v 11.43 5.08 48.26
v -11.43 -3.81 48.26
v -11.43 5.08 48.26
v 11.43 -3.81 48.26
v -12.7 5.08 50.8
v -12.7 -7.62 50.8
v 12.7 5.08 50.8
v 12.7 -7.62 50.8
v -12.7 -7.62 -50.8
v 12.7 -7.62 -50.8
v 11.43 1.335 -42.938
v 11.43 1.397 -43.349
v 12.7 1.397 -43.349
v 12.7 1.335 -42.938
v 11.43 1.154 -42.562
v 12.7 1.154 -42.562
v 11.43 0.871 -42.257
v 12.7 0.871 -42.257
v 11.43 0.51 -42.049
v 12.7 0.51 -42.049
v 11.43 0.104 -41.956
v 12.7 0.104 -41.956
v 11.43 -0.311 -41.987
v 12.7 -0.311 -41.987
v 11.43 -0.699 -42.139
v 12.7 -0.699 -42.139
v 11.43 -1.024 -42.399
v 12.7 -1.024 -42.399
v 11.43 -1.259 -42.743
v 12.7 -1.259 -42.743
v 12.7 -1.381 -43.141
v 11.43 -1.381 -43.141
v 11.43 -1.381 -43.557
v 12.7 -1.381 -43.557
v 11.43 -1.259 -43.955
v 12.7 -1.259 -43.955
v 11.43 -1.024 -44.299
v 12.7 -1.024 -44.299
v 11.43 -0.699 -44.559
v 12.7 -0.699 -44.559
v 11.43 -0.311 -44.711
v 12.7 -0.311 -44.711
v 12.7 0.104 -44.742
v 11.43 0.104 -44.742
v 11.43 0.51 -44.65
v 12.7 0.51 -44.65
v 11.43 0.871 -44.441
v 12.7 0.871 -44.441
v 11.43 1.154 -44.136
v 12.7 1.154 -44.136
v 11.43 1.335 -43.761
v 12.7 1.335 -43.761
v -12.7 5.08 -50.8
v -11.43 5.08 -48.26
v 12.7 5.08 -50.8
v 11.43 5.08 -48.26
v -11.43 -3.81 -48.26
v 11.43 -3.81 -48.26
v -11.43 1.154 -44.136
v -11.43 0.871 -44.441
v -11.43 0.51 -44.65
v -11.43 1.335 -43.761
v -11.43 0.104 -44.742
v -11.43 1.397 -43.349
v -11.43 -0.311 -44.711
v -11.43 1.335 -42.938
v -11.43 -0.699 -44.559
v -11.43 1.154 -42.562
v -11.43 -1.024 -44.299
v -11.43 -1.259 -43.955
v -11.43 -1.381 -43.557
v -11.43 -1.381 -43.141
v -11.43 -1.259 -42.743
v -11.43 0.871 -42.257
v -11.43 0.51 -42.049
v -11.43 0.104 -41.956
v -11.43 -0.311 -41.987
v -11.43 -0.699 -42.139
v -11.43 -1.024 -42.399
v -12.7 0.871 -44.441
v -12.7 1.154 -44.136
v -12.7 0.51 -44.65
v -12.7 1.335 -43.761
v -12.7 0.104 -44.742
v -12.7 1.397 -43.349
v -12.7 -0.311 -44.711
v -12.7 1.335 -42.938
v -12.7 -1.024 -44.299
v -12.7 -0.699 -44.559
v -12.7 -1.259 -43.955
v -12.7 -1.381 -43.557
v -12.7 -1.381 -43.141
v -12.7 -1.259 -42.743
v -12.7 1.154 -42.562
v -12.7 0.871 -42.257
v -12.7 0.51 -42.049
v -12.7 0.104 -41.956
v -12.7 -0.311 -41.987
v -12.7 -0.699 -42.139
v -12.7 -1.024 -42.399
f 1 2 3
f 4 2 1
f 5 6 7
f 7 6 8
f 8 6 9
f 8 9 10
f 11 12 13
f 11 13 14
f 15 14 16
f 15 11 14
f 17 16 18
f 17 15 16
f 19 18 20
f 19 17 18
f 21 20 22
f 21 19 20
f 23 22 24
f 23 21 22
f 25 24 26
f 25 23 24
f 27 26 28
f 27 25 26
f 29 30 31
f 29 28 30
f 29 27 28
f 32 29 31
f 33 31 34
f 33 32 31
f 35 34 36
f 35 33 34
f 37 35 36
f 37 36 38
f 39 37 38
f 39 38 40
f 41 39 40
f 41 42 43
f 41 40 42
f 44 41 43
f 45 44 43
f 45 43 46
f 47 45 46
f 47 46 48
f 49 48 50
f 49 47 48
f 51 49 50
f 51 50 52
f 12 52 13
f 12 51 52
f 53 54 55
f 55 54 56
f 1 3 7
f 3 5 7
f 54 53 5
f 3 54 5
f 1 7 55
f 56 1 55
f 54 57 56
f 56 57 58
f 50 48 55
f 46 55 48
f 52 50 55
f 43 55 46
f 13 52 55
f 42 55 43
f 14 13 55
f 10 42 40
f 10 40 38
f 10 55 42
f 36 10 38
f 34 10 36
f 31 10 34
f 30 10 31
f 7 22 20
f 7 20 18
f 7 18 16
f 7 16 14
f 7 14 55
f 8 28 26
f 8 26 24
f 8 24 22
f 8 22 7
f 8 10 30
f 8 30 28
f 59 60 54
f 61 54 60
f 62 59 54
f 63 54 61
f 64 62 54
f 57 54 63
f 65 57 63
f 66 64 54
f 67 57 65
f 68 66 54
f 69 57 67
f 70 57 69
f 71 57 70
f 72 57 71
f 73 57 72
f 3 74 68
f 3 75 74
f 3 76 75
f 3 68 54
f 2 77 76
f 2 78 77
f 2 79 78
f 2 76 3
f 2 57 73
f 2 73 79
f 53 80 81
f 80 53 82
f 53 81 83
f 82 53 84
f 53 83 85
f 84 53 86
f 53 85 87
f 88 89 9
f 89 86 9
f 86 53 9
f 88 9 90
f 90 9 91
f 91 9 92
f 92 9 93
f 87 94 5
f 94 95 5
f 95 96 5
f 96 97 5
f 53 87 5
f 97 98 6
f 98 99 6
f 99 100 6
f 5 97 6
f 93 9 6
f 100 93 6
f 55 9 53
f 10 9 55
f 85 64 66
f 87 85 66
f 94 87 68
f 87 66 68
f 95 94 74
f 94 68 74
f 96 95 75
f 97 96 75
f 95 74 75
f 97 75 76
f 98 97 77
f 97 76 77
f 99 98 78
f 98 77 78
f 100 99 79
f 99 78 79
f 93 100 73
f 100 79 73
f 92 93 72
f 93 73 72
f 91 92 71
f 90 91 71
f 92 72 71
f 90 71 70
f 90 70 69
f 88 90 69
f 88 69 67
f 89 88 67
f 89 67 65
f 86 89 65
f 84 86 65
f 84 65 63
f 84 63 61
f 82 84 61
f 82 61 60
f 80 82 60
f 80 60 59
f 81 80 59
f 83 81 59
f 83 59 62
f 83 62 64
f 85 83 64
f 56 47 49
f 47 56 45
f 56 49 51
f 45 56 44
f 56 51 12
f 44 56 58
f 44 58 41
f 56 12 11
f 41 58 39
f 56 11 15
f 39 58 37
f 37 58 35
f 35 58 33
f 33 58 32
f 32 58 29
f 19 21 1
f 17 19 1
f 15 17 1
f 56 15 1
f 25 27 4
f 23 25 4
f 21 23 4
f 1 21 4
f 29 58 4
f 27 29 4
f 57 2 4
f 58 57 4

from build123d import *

# Parameters (mm, degrees)
F0_W          = 25.4
F0_H          = 101.6
F1_DEPTH      = 7.62
F1_DEPTH_BACK = 5.08
F2_W          = 22.86
F2_H          = 96.52
F3_DEPTH      = 3.81
F3_DEPTH_BACK = 25.4
F4_R          = 1.397
F5_DEPTH      = 15.24
F5_DEPTH_BACK = 15.24


with BuildPart() as f1:
    # F0 (on Front) → F1 (new body, two sides)
    with BuildSketch(Plane.XZ) as f1_sk:
        Rectangle(F0_W, F0_H)
    extrude(amount=F1_DEPTH)
    extrude(f1_sk.sketch, amount=-F1_DEPTH_BACK)

    # F2 (on Front) → F3 (cut, two sides)
    with BuildSketch(Plane.XZ) as f3_sk:
        Rectangle(F2_W, F2_H)
    extrude(amount=F3_DEPTH, mode=Mode.SUBTRACT)
    extrude(f3_sk.sketch, amount=-F3_DEPTH_BACK, mode=Mode.SUBTRACT)

    # F4 (on Right) → F5 (cut, two sides)
    with BuildSketch(Plane.YZ) as f5_sk:
        with Locations((0, -43.349277)):
            Circle(F4_R)
    extrude(amount=F5_DEPTH, mode=Mode.SUBTRACT)
    extrude(f5_sk.sketch, amount=-F5_DEPTH_BACK, mode=Mode.SUBTRACT)


solid = f1.part
